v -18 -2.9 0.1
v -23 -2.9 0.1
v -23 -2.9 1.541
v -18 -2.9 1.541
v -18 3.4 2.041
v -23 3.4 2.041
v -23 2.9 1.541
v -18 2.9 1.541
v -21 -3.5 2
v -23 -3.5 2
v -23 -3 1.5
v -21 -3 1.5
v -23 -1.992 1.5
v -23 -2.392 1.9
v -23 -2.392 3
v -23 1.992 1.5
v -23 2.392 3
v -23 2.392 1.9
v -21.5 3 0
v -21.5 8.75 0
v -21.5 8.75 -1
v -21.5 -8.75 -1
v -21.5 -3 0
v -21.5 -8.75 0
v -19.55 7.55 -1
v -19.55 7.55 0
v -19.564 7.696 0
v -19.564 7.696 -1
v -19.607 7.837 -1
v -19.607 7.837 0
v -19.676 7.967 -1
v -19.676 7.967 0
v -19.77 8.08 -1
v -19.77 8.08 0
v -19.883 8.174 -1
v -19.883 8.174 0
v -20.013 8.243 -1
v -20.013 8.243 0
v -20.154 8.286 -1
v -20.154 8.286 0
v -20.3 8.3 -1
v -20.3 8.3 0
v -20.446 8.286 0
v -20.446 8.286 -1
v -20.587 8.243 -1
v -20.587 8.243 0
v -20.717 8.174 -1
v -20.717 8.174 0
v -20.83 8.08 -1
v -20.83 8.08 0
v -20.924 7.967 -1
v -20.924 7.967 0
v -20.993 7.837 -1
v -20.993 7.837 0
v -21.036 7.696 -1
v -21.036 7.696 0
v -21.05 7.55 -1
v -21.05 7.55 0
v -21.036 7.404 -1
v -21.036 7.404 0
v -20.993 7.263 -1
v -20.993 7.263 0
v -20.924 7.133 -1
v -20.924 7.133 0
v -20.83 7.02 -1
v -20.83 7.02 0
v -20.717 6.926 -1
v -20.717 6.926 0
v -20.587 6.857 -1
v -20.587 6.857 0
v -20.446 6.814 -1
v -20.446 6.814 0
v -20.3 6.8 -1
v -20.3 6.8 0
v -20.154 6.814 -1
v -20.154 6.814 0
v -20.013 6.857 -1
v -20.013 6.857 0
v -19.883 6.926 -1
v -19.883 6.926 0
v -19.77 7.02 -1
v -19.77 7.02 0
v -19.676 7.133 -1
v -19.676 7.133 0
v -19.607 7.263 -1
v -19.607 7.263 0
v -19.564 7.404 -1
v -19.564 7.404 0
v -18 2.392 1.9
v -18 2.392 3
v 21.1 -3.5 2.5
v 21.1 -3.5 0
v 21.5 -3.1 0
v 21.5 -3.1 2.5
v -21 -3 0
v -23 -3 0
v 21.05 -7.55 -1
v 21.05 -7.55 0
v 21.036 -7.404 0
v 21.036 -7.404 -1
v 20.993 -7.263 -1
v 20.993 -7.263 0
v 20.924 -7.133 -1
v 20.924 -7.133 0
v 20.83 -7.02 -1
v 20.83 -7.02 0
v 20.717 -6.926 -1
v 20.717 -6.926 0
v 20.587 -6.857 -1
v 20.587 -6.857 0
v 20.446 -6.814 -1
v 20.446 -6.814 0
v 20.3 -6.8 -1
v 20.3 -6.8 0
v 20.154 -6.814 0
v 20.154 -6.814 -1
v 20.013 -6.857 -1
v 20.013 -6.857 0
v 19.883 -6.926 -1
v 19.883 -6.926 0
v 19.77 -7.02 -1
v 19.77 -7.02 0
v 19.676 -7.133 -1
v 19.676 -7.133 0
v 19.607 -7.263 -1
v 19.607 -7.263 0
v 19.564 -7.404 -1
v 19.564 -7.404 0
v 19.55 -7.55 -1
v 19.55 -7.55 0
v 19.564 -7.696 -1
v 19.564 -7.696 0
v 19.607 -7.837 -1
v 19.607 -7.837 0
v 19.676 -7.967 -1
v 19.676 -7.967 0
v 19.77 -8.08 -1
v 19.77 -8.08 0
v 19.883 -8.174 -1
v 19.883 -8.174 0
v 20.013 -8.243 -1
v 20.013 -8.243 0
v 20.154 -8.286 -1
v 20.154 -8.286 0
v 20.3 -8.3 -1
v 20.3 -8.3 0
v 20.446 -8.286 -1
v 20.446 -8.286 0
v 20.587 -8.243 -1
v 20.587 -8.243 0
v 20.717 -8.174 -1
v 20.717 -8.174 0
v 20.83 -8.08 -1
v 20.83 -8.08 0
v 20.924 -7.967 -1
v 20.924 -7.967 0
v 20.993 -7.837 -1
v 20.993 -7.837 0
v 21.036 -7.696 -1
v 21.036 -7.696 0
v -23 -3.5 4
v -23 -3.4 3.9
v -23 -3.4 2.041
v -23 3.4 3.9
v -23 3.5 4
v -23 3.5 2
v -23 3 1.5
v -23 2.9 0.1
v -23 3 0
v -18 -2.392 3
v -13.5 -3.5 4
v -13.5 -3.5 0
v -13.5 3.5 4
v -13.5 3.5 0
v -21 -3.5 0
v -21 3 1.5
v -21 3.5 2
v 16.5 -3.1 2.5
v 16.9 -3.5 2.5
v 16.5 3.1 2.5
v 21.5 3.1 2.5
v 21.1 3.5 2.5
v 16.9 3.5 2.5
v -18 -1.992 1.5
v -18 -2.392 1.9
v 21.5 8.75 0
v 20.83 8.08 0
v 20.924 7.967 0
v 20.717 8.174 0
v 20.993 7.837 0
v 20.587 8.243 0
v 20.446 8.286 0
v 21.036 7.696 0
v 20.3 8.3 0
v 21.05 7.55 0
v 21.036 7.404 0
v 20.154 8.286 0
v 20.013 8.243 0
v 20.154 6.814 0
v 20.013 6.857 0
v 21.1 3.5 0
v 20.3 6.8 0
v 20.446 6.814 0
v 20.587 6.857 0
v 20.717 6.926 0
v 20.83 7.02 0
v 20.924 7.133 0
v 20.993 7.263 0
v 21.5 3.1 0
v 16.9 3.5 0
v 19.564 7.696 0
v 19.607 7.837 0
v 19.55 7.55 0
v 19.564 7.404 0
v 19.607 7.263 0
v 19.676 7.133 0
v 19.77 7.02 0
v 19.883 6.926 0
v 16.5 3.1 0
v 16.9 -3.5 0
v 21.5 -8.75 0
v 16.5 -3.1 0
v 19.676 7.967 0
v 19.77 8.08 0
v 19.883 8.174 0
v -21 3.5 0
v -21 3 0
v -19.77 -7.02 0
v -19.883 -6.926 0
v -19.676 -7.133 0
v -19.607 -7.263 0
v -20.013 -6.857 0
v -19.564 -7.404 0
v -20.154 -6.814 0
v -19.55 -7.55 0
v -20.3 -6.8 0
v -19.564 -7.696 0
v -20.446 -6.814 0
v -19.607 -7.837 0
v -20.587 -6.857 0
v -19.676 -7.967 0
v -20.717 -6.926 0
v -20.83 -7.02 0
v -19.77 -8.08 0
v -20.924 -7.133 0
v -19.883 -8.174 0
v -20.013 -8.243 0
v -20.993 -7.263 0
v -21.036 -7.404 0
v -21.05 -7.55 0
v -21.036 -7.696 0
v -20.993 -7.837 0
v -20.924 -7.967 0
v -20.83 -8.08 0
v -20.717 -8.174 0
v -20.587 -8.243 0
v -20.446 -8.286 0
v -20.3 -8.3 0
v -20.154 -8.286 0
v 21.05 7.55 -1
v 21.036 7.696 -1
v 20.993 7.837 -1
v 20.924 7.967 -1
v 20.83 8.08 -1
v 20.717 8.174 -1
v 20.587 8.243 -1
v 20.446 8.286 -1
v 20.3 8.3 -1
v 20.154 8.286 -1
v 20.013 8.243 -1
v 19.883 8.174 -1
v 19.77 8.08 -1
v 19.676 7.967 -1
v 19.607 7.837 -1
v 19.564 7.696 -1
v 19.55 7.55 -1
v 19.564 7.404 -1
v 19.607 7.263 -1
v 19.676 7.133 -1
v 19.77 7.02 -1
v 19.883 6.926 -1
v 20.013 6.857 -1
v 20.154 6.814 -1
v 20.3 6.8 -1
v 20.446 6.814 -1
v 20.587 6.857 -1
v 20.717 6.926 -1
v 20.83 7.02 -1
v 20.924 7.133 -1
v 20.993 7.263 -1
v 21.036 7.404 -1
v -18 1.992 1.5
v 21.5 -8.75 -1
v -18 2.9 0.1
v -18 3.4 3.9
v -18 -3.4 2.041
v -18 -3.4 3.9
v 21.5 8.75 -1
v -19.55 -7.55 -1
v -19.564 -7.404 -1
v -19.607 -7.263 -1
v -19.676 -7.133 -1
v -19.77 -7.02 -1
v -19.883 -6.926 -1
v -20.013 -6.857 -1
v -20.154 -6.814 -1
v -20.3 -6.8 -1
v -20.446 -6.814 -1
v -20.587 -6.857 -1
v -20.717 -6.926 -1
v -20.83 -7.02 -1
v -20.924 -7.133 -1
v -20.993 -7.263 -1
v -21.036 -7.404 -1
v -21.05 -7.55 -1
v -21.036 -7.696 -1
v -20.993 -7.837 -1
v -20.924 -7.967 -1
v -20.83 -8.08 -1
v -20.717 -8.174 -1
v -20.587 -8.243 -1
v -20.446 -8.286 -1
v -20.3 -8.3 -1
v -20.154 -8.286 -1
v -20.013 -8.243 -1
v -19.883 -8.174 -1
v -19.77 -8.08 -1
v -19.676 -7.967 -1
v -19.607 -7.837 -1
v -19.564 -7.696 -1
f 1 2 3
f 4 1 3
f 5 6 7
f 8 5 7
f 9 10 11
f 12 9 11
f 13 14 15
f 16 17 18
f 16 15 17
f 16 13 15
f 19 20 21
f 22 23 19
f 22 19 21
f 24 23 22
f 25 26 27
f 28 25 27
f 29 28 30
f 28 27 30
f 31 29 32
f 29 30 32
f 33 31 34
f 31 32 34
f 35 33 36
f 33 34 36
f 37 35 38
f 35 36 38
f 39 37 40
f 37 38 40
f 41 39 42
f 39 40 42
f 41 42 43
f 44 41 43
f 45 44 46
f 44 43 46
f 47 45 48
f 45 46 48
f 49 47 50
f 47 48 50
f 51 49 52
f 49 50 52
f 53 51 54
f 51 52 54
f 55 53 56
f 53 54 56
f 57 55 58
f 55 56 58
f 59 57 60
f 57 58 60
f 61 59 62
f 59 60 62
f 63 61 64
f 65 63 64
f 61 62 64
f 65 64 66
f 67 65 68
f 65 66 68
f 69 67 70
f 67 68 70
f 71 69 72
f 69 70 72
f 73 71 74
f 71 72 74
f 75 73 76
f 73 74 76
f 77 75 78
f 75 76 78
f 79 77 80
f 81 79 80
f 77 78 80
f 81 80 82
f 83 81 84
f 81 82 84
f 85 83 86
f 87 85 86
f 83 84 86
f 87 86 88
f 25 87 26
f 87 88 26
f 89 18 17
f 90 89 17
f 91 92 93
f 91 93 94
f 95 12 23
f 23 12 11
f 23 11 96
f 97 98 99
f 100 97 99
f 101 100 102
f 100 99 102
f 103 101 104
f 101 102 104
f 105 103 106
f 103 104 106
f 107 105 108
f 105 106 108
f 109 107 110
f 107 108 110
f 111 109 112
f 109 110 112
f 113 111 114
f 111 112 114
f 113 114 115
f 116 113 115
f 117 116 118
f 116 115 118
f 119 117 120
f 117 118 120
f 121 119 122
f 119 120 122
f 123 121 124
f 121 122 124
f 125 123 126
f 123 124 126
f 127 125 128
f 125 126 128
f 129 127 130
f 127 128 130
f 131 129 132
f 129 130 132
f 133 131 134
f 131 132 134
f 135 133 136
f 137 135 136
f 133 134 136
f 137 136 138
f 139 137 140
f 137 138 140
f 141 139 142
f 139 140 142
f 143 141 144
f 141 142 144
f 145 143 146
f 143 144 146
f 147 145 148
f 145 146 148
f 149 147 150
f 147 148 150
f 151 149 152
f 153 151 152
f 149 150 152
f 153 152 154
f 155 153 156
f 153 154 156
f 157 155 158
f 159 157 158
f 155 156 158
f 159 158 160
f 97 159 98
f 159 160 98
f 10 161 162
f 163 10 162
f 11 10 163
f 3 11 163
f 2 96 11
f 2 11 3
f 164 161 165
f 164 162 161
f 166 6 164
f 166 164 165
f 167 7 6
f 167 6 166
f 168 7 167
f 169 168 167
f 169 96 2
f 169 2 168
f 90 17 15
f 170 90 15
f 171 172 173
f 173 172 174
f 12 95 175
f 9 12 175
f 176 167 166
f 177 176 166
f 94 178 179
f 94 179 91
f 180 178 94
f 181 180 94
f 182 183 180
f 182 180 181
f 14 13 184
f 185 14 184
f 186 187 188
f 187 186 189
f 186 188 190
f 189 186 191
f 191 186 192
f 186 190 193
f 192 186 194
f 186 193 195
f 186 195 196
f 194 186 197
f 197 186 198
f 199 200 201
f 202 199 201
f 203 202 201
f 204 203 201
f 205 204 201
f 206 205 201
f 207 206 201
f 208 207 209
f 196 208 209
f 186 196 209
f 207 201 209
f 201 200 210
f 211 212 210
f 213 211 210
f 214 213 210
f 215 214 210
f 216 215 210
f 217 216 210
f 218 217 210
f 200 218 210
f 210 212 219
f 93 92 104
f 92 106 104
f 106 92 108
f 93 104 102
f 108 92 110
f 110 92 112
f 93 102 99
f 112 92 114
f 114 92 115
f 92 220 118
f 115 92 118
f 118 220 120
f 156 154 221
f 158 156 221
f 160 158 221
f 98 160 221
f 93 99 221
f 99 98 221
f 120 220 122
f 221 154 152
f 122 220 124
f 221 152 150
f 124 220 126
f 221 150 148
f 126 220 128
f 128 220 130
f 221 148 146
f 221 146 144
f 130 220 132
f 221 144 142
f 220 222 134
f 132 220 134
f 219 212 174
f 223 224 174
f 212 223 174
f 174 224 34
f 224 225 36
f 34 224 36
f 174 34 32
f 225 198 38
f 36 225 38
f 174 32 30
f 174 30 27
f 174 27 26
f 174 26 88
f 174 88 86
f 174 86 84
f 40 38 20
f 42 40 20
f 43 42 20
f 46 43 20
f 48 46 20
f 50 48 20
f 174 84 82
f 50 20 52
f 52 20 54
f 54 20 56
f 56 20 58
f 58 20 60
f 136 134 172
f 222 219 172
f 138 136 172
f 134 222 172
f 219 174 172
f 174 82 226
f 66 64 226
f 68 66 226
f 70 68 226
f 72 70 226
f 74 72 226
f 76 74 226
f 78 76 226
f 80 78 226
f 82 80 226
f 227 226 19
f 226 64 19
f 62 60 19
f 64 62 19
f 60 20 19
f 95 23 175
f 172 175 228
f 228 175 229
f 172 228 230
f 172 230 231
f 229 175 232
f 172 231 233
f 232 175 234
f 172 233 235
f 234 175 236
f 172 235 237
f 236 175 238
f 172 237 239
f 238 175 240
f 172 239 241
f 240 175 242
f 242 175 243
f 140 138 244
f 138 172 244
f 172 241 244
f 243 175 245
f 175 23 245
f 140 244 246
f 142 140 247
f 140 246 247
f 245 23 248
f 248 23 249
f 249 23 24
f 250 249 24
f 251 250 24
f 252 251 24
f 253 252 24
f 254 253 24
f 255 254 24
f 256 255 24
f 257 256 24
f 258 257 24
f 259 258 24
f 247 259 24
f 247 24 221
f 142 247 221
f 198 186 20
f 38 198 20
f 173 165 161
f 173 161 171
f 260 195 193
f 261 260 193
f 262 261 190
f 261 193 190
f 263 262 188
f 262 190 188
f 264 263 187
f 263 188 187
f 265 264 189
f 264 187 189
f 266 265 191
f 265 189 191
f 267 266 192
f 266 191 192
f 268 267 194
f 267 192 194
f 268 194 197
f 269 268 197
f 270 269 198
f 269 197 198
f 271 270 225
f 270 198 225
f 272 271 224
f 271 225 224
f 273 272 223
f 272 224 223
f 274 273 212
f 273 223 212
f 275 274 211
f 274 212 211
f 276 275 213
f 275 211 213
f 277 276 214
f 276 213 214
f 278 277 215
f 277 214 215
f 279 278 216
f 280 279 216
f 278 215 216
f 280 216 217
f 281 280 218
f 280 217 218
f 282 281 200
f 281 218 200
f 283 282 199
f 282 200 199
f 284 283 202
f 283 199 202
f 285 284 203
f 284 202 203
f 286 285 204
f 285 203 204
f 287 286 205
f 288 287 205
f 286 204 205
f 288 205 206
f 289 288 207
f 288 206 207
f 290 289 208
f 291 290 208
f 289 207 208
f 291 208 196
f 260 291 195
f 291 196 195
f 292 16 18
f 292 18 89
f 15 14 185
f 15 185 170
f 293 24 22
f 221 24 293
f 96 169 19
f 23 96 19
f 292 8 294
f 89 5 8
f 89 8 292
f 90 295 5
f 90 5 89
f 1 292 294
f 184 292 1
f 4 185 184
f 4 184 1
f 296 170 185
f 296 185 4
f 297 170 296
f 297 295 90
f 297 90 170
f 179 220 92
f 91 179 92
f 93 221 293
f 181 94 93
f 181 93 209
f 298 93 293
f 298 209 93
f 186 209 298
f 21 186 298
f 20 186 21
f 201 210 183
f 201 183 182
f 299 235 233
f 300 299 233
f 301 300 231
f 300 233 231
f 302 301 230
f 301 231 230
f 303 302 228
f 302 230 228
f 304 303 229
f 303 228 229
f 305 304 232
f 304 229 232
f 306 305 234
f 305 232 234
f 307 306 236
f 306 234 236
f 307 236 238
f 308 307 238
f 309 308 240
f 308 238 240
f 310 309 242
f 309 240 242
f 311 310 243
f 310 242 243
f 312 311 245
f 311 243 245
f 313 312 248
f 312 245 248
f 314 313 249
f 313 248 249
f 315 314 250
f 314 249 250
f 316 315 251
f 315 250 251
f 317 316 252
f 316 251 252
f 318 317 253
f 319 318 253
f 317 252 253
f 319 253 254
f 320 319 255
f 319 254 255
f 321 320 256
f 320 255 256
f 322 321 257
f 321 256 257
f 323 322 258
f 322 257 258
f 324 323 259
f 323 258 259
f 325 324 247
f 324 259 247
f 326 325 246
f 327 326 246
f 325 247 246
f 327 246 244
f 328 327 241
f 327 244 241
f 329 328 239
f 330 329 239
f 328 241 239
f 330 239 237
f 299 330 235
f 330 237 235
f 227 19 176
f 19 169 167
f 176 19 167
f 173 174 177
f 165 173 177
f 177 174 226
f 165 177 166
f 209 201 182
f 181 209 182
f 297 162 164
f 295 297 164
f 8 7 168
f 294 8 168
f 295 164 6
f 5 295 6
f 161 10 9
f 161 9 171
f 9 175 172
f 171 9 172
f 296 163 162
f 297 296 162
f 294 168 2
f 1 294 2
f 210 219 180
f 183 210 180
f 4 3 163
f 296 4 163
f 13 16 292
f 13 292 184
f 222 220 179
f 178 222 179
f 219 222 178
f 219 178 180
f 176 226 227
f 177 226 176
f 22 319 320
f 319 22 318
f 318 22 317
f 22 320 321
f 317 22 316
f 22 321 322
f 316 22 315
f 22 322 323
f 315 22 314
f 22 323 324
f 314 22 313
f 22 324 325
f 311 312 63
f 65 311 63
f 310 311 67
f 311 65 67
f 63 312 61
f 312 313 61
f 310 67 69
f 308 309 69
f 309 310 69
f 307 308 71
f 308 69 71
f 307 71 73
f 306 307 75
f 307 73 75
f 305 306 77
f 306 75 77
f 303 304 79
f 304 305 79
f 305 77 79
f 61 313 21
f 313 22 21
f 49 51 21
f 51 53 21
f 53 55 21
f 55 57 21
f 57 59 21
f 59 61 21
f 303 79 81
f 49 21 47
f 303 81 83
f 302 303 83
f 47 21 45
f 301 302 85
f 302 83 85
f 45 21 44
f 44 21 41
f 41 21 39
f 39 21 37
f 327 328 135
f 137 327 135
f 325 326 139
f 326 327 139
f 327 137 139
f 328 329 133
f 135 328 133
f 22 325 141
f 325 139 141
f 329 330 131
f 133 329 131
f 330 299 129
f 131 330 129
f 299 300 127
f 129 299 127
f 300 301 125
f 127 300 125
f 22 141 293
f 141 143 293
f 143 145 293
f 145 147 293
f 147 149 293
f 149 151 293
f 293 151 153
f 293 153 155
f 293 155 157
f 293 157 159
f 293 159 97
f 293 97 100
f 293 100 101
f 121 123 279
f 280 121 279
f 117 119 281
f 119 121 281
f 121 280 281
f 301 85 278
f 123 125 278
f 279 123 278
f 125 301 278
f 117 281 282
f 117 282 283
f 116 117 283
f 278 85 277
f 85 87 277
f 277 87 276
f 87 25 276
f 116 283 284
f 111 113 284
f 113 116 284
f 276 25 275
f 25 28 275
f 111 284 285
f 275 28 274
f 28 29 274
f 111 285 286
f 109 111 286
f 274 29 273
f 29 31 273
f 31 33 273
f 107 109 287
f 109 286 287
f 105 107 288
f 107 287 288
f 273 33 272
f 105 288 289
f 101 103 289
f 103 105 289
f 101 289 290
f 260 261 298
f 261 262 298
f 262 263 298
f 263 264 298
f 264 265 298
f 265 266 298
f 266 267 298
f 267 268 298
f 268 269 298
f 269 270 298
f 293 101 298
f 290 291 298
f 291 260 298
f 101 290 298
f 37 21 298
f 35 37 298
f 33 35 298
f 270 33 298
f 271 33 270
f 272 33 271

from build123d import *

# Parameters (mm, degrees)
F0_W     = 8
F0_H     = 7
F0_R     = 0.75
F0_W_2   = 5
F1_DEPTH = 1
F0_W_3   = 1.5
F2_DEPTH = 4
F3_DEPTH = 2.5
F4_W     = 4.784234
F4_H     = 1.5
F5_DEPTH = 5
F6_DEPTH = 2
F7_SIZE  = 0.4
F8_SIZE  = 0.4


with BuildPart() as f1:
    # F0 (on Top) → F1 (new body)
    with BuildSketch(Plane.XY):
        with Locations((-17.5, 0)):
            Rectangle(F0_W, F0_H)
        Polygon((21.5, 3.5), (21.5, 8.75), (-21.5, 8.75), (-21.5, 3.5), (-13.5, 3.5), (-13.5, -3.5), (-21.5, -3.5), (-21.5, -8.75), (21.5, -8.75), (21.5, -3.5), (16.5, -3.5), (16.5, 3.5), align=None)
        with Locations((-20.3, -7.55)):
            Circle(F0_R, mode=Mode.SUBTRACT)
        with Locations((20.3, -7.55)):
            Circle(F0_R, mode=Mode.SUBTRACT)
        with Locations((-20.3, 7.55)):
            Circle(F0_R, mode=Mode.SUBTRACT)
        with Locations((20.3, 7.55)):
            Circle(F0_R, mode=Mode.SUBTRACT)
        with Locations((19, 0)):
            Rectangle(F0_W_2, F0_H)
    extrude(amount=-F1_DEPTH)

    # F0 (on Top) → F2 (join)
    with BuildSketch(Plane.XY):
        with Locations((-22.25, 0)):
            Rectangle(F0_W_3, F0_H)
        with Locations((-17.5, 0)):
            Rectangle(F0_W, F0_H)
    extrude(amount=F2_DEPTH)

    # F0 (on Top) → F3 (join)
    with BuildSketch(Plane.XY):
        with Locations((19, 0)):
            Rectangle(F0_W_2, F0_H)
    extrude(amount=F3_DEPTH)

    # F4 (on face) → F5 (cut)
    with BuildSketch(Plane(origin=(-23, 0, 0), x_dir=(0, -1, 0), z_dir=(-1, 0, 0))):
        Polygon((3.4, 3.9), (-3.4, 3.9), (-3.4, 2.041421), (-2.9, 1.541421), (-2.9, 0.1), (2.9, 0.1), (2.9, 1.541421), (3.4, 2.041421), align=None)
        with Locations((0, 2.25)):
            Rectangle(F4_W, F4_H, mode=Mode.SUBTRACT)
    extrude(amount=-F5_DEPTH, mode=Mode.SUBTRACT)

    # F4 (on face) → F6 (cut)
    with BuildSketch(Plane(origin=(-23, 0, 0), x_dir=(0, -1, 0), z_dir=(-1, 0, 0))):
        Polygon((-3, 1.5), (-3.5, 2), (-3.5, 0), (-3, 0), align=None)
        Polygon((3, 1.5), (3, 0), (3.5, 0), (3.5, 2), align=None)
    extrude(amount=-F6_DEPTH, mode=Mode.SUBTRACT)

    # F7
    f7_edges = [f1.edges().sort_by_distance(p)[0] for p in [
        (-20.5, -2.392117, 1.5),
        (-20.5, 2.392117, 1.5),
    ]]
    chamfer(f7_edges, length=F7_SIZE)

    # F8
    f8_edges = [f1.edges().sort_by_distance(p)[0] for p in [
        (21.5, 3.5, 1.25),
        (16.5, 3.5, 1.25),
        (21.5, -3.5, 1.25),
        (16.5, -3.5, 1.25),
    ]]
    chamfer(f8_edges, length=F8_SIZE)


solid = f1.part
